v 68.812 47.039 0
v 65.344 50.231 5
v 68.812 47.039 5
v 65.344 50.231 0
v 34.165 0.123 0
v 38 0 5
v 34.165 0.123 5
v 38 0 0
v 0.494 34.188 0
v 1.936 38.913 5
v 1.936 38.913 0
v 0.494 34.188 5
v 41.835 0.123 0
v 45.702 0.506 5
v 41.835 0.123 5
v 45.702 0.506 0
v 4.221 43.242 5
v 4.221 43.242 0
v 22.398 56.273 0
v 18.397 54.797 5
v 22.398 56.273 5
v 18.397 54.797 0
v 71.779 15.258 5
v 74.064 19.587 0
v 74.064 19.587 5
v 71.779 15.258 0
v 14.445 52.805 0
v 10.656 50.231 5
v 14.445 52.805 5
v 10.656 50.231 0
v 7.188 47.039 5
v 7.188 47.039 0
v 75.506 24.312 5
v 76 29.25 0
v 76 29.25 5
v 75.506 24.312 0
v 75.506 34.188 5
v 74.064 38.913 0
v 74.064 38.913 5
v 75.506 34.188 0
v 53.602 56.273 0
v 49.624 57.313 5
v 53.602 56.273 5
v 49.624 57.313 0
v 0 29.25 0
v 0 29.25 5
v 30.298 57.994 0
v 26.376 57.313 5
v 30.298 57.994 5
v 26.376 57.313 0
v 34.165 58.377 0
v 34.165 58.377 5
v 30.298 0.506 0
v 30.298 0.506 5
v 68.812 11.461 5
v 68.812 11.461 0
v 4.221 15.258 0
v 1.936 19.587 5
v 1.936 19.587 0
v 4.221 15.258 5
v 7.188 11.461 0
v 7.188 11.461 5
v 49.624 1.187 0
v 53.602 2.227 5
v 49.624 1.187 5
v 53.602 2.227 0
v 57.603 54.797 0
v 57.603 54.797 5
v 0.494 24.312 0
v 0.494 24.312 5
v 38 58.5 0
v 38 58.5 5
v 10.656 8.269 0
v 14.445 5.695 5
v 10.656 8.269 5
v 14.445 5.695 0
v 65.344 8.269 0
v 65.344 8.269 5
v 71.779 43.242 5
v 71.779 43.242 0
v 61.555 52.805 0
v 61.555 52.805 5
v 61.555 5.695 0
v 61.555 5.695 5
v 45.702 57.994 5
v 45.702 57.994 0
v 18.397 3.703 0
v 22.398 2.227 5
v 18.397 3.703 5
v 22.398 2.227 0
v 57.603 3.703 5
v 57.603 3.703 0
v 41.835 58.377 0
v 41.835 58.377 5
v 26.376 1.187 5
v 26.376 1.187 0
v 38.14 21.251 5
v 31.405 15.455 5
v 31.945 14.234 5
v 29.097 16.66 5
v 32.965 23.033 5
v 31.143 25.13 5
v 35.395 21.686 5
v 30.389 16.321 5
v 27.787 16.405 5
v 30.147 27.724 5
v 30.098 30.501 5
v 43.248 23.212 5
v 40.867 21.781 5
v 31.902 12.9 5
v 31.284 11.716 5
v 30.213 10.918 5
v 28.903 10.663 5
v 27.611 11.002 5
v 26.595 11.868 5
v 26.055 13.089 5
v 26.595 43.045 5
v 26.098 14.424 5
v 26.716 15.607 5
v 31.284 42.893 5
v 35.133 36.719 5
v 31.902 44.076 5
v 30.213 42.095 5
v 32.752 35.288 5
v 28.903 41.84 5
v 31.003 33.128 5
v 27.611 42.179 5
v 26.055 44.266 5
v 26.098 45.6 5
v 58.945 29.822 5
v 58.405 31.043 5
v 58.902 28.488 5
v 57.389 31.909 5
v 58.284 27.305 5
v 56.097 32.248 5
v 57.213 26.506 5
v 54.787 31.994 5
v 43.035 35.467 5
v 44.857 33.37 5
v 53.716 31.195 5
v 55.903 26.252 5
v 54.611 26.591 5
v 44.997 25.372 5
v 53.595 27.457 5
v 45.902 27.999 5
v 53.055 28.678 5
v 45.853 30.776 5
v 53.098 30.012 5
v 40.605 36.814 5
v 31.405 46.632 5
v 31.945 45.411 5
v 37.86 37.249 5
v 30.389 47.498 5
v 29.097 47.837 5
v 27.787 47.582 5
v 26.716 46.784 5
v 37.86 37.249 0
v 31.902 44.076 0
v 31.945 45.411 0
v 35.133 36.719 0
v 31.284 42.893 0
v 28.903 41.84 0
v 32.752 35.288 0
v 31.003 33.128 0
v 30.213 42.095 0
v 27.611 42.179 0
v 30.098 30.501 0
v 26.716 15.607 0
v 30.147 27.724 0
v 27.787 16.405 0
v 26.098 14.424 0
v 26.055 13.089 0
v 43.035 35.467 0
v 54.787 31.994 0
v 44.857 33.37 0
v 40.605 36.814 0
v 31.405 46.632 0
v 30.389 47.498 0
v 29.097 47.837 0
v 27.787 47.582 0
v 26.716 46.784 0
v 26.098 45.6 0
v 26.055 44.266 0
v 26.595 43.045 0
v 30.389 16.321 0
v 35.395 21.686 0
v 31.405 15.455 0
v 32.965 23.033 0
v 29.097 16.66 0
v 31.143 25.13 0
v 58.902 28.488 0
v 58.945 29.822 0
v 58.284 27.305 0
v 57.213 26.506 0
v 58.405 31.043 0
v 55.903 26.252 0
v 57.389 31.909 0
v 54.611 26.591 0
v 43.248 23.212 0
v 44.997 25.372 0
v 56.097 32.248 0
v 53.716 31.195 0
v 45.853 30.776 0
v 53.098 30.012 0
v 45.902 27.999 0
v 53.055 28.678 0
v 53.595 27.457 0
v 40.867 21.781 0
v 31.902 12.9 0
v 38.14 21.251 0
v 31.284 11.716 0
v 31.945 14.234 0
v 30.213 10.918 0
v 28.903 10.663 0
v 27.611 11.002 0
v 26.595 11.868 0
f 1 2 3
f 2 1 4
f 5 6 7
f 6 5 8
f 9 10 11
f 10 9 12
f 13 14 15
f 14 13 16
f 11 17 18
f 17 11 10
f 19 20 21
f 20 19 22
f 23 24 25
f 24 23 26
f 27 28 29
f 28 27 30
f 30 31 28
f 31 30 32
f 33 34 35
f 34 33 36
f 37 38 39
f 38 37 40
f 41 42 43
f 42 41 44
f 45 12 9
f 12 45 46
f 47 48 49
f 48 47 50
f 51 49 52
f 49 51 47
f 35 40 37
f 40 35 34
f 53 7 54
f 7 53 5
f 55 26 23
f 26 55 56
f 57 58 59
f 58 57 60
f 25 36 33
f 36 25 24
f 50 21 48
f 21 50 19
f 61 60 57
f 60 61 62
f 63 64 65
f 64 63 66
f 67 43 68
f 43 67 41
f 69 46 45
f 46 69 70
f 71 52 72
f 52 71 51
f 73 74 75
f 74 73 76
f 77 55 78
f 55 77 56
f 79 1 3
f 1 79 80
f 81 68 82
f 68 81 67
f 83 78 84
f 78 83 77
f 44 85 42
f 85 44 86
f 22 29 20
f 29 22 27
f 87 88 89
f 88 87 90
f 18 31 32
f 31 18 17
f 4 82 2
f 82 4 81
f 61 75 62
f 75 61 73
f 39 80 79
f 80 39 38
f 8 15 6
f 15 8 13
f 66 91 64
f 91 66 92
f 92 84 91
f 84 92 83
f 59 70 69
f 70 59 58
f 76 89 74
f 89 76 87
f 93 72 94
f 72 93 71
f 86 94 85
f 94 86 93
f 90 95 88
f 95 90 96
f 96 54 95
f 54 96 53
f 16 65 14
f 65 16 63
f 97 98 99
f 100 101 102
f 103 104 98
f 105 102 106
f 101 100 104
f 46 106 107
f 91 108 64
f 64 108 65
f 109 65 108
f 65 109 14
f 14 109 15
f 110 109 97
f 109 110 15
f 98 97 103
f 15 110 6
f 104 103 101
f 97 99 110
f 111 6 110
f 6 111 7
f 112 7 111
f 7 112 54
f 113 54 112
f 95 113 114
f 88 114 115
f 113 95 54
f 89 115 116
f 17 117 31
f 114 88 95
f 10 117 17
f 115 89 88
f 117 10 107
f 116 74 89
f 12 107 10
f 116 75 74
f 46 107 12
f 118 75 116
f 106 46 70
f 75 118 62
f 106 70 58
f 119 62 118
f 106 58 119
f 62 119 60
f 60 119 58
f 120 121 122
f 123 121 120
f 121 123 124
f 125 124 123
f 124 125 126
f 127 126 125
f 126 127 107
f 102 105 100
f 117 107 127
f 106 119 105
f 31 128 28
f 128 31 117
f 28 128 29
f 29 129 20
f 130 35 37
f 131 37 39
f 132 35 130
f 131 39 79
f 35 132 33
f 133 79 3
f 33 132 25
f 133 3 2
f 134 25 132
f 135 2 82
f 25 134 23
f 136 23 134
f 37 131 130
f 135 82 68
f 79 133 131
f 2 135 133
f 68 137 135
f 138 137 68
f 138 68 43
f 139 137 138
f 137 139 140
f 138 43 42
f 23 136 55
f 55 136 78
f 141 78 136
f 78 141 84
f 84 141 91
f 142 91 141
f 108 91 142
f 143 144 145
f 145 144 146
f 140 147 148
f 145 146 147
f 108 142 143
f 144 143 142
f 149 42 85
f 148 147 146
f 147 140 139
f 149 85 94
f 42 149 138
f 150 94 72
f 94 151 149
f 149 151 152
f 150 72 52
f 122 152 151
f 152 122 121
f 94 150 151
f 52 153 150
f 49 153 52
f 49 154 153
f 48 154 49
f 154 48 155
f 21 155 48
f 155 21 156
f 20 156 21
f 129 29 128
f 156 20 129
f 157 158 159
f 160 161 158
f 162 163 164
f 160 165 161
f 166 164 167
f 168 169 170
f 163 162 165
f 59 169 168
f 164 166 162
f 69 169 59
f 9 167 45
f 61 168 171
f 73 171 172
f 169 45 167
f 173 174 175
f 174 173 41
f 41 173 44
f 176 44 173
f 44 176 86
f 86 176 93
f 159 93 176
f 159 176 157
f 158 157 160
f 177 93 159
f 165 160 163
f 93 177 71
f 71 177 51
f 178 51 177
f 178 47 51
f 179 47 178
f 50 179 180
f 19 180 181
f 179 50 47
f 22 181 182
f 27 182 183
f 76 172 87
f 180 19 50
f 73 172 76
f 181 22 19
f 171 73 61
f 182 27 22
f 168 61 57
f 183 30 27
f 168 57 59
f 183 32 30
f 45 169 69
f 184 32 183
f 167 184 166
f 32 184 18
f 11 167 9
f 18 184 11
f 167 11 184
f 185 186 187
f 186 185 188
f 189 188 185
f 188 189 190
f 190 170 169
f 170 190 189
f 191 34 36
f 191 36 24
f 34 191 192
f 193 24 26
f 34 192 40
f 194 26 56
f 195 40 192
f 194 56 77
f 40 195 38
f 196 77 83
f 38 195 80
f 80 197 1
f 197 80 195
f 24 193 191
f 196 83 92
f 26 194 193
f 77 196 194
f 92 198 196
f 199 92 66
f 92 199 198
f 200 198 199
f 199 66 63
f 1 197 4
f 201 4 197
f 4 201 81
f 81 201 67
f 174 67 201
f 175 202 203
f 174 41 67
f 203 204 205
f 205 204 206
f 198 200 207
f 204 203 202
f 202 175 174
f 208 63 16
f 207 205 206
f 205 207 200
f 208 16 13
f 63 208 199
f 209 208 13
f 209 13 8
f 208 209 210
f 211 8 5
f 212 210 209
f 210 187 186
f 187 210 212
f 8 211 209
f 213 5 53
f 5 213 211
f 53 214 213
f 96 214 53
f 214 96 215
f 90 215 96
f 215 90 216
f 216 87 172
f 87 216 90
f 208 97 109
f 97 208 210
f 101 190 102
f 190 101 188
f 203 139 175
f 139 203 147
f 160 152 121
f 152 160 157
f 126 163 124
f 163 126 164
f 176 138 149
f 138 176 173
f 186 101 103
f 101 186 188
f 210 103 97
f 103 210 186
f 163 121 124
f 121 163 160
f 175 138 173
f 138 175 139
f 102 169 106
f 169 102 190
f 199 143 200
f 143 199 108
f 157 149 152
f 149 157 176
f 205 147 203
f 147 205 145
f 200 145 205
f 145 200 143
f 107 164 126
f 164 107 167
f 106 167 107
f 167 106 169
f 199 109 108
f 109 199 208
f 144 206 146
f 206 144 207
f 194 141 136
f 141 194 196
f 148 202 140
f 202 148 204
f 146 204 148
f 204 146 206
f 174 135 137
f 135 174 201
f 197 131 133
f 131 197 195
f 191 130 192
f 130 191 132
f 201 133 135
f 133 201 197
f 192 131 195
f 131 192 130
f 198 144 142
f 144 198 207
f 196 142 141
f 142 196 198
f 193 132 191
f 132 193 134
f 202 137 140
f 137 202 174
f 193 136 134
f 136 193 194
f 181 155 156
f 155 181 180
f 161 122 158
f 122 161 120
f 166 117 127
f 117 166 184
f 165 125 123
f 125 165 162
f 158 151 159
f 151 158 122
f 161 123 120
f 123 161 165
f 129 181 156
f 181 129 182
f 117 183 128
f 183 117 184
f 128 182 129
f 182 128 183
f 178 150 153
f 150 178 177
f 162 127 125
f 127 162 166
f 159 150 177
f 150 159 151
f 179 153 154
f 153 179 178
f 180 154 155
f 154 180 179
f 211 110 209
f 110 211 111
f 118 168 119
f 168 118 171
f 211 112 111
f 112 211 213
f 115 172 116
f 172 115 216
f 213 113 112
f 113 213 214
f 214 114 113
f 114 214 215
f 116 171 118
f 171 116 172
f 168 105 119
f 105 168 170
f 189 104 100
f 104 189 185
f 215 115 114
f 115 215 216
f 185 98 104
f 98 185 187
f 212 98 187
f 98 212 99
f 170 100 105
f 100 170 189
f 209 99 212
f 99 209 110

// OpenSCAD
$fn = 32;

// ----------------------------------------------------------------------
// Cam plate: double_lobe cam, base R28
// ----------------------------------------------------------------------

// --- parameters (mm) ---
base_r = 28;              // base circle radius
lobe_h = 10;              // cam lobe rise
bore_r = 8;               // shaft bore radius
plate_t = 5;              // plate thickness, Z (extrusion height)
ring_r = 18;              // lightening ring radius
bolt_r = 3;               // lightening hole radius

profile = [[76, 29.25], [75.506, 34.188], [74.064, 38.913], [71.779, 43.242], [68.812, 47.039], [65.344, 50.231], [61.555, 52.805], [57.603, 54.797], [53.602, 56.273], [49.624, 57.313], [45.702, 57.994], [41.835, 58.377], [38, 58.5], [34.165, 58.377], [30.298, 57.994], [26.376, 57.313], [22.398, 56.273], [18.397, 54.797], [14.445, 52.805], [10.656, 50.231], [7.188, 47.039], [4.221, 43.242], [1.936, 38.913], [0.494, 34.188], [0, 29.25], [0.494, 24.312], [1.936, 19.587], [4.221, 15.258], [7.188, 11.461], [10.656, 8.269], [14.445, 5.695], [18.397, 3.703], [22.398, 2.227], [26.376, 1.187], [30.298, 0.506], [34.165, 0.123], [38, 0], [41.835, 0.123], [45.702, 0.506], [49.624, 1.187], [53.602, 2.227], [57.603, 3.703], [61.555, 5.695], [65.344, 8.269], [68.812, 11.461], [71.779, 15.258], [74.064, 19.587], [75.506, 24.312]];  // primary outline, 48 points, counter clockwise
void_1 = [[45.853, 30.776], [44.857, 33.37], [43.035, 35.467], [40.605, 36.814], [37.86, 37.249], [35.133, 36.719], [32.752, 35.288], [31.003, 33.128], [30.098, 30.501], [30.147, 27.724], [31.143, 25.13], [32.965, 23.033], [35.395, 21.686], [38.14, 21.251], [40.867, 21.781], [43.248, 23.212], [44.997, 25.372], [45.902, 27.999]];  // shaft bore, 18 points
void_2 = [[58.945, 29.822], [58.405, 31.043], [57.389, 31.909], [56.097, 32.248], [54.787, 31.994], [53.716, 31.195], [53.098, 30.012], [53.055, 28.678], [53.595, 27.457], [54.611, 26.591], [55.903, 26.252], [57.213, 26.506], [58.284, 27.305], [58.902, 28.488]];  // lightening hole 1, 14 points
void_3 = [[31.945, 45.411], [31.405, 46.632], [30.389, 47.498], [29.097, 47.837], [27.787, 47.582], [26.716, 46.784], [26.098, 45.6], [26.055, 44.266], [26.595, 43.045], [27.611, 42.179], [28.903, 41.84], [30.213, 42.095], [31.284, 42.893], [31.902, 44.076]];  // lightening hole 2, 14 points
void_4 = [[31.945, 14.234], [31.405, 15.455], [30.389, 16.321], [29.097, 16.66], [27.787, 16.405], [26.716, 15.607], [26.098, 14.424], [26.055, 13.089], [26.595, 11.868], [27.611, 11.002], [28.903, 10.663], [30.213, 10.918], [31.284, 11.716], [31.902, 12.9]];  // lightening hole 3, 14 points

// --- the one profile operation ---
difference() {
  linear_extrude(height = plate_t) polygon(points = profile);
  translate([0, 0, -1])
    linear_extrude(height = plate_t + 2) polygon(points = void_1);
  translate([0, 0, -1])
    linear_extrude(height = plate_t + 2) polygon(points = void_2);
  translate([0, 0, -1])
    linear_extrude(height = plate_t + 2) polygon(points = void_3);
  translate([0, 0, -1])
    linear_extrude(height = plate_t + 2) polygon(points = void_4);
}
